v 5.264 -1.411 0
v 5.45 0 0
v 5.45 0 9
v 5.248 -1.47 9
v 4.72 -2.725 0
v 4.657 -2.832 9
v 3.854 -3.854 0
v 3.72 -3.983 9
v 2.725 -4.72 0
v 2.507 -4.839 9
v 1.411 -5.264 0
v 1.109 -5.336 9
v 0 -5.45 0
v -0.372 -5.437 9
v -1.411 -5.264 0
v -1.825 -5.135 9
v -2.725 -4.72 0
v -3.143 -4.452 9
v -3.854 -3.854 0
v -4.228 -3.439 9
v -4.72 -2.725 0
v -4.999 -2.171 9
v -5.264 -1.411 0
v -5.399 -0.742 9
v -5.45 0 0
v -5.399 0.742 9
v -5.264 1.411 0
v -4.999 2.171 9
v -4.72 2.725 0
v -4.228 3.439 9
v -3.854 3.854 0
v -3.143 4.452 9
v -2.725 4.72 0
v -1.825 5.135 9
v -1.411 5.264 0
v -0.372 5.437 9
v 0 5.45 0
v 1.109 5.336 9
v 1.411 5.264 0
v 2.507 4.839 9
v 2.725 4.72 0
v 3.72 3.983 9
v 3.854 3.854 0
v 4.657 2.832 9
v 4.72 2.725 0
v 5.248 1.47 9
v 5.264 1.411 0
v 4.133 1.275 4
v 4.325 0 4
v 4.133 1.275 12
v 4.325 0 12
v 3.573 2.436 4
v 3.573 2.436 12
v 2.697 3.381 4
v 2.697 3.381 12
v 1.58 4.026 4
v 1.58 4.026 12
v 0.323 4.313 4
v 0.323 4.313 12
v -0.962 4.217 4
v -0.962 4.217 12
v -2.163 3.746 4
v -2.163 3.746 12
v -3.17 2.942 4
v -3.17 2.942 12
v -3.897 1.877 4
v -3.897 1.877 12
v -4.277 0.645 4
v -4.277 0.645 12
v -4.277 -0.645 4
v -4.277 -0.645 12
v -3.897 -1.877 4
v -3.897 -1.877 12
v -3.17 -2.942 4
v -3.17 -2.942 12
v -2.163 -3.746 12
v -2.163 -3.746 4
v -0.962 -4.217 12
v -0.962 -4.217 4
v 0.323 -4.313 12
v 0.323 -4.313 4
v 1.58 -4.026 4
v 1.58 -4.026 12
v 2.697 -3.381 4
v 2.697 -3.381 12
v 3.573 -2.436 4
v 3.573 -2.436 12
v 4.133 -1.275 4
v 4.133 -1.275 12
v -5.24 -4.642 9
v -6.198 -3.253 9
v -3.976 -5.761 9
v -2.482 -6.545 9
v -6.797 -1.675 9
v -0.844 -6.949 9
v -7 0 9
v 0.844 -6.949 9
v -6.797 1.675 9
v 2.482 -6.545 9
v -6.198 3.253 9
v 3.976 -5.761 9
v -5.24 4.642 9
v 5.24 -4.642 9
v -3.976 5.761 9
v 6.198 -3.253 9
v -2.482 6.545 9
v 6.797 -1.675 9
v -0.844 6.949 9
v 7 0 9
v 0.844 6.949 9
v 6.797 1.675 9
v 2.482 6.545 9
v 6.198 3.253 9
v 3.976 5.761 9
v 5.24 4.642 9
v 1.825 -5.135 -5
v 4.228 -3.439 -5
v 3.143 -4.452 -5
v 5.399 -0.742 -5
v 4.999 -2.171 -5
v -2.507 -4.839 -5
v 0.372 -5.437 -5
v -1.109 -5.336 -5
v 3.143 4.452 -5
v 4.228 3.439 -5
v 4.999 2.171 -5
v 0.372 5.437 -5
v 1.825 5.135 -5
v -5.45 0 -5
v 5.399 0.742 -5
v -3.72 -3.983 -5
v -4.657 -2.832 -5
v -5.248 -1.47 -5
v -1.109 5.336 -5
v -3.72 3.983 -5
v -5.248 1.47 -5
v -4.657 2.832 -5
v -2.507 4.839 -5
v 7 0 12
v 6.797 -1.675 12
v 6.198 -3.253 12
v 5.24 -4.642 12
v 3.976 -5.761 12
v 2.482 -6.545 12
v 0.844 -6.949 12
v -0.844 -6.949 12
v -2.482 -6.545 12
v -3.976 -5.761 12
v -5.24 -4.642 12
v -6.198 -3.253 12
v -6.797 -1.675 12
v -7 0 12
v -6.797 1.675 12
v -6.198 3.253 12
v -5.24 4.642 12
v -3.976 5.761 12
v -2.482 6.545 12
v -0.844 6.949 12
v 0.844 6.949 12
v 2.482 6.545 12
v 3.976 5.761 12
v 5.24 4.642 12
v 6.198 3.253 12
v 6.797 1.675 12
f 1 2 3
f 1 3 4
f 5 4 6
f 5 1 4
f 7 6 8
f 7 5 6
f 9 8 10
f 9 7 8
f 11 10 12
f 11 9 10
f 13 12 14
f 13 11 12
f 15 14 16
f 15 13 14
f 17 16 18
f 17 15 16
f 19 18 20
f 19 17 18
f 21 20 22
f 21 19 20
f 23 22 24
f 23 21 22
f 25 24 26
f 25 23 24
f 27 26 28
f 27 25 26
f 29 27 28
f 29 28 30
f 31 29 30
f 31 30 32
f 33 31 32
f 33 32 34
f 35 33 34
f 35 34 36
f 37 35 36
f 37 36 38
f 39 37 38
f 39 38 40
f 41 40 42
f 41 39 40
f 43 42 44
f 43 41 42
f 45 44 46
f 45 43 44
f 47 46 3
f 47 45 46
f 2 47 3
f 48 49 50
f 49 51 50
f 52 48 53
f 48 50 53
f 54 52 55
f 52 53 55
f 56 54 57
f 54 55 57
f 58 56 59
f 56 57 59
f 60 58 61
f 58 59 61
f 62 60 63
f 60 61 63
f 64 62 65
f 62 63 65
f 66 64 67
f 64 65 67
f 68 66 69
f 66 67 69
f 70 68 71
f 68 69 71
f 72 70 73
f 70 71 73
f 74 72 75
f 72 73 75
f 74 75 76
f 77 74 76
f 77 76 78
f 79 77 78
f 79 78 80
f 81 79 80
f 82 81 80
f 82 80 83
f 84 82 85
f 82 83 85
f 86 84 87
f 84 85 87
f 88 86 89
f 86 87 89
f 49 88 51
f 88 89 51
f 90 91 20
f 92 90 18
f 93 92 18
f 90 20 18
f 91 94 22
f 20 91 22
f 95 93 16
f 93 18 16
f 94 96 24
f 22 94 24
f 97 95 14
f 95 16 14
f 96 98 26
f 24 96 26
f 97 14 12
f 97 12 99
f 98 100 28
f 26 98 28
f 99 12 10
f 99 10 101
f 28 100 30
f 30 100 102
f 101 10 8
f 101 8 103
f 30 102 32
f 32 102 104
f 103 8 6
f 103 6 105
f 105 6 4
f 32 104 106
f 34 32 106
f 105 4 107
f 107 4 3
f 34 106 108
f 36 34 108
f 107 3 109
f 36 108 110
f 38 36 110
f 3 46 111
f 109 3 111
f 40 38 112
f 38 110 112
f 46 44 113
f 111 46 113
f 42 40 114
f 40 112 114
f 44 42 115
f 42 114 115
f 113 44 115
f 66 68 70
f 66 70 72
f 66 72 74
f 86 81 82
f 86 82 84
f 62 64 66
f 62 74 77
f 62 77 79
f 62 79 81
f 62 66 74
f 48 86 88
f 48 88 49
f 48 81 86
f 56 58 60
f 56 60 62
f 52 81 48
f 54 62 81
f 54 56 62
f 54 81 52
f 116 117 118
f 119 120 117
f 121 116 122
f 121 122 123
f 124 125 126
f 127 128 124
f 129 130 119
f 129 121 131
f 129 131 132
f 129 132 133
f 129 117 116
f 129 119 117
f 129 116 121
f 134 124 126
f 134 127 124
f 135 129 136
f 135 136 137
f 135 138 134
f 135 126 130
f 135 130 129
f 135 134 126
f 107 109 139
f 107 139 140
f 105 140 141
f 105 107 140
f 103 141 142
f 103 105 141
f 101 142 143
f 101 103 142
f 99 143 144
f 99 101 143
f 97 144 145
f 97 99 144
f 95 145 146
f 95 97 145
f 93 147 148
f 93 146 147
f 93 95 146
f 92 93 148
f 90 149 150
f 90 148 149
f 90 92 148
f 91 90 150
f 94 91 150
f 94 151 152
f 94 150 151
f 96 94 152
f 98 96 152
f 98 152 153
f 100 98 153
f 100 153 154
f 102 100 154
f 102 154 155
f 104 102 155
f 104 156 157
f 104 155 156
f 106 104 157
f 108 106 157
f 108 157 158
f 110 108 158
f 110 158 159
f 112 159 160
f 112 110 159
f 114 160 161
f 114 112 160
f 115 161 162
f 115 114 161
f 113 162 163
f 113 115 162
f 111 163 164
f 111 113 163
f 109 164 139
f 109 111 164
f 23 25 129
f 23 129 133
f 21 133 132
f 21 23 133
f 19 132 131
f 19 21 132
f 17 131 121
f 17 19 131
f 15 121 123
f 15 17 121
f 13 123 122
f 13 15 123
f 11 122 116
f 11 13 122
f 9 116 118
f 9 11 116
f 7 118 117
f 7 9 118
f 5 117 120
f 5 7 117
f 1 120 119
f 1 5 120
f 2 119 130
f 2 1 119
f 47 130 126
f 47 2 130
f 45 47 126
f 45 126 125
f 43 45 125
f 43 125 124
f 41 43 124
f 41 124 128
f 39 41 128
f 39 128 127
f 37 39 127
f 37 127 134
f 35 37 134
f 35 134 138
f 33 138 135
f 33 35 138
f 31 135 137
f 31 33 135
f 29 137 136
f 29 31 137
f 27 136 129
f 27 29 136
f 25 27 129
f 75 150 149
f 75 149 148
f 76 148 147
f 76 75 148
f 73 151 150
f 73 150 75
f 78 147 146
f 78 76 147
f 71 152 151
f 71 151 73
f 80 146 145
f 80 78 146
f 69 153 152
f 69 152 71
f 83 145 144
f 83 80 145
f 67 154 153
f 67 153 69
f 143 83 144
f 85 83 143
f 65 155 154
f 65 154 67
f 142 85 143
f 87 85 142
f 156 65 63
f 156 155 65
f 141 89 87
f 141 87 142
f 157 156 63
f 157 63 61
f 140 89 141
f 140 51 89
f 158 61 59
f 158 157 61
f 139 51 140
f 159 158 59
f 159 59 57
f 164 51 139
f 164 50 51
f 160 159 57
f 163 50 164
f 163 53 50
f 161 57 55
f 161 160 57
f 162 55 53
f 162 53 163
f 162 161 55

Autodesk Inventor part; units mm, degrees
ref_plane "YZ Plane" through (0, 0, 0) normal (1, 0, 0) x (0, 1, 0)
ref_plane "XZ Plane" through (0, 0, 0) normal (0, 1, 0) x (-1, 0, 0)
ref_plane "XY Plane" through (0, 0, 0) normal (0, 0, 1) x (1, 0, 0)
sketch "Sketch5" plane through (0, 0, 0) normal (0, 0, 1) x (1, 0, 0)
  circle A0 centre (0, 0) radius 5.45
  dimension "d0" = 10.9
extrude "Extrusion1" add sketch "Sketch5" along normal blind 9
sketch "Sketch6" plane through (0, 0, 9) normal (0, 0, 1) x (1, 0, 0)
  circle A0 centre (0, 0) radius 7
  dimension "d3" = 14
extrude "Extrusion2" add sketch "Sketch6" along normal blind 3
sketch "Sketch7" plane through (0, 0, 12) normal (0, 0, 1) x (1, 0, 0)
  circle A0 centre (0, 0) radius 4.325
  dimension "d6" = 8.65
extrude "Extrusion3" cut sketch "Sketch7" against normal blind 8
sketch "Sketch8" plane through (0, 0, 0) normal (0, 0, -1) x (-1, 0, 0)
  circle A0 centre (0, 0) radius 5.45
  dimension "d9" = 10.9
extrude "Extrusion4" add sketch "Sketch8" along normal blind 5
properties part number "zaślepka"
